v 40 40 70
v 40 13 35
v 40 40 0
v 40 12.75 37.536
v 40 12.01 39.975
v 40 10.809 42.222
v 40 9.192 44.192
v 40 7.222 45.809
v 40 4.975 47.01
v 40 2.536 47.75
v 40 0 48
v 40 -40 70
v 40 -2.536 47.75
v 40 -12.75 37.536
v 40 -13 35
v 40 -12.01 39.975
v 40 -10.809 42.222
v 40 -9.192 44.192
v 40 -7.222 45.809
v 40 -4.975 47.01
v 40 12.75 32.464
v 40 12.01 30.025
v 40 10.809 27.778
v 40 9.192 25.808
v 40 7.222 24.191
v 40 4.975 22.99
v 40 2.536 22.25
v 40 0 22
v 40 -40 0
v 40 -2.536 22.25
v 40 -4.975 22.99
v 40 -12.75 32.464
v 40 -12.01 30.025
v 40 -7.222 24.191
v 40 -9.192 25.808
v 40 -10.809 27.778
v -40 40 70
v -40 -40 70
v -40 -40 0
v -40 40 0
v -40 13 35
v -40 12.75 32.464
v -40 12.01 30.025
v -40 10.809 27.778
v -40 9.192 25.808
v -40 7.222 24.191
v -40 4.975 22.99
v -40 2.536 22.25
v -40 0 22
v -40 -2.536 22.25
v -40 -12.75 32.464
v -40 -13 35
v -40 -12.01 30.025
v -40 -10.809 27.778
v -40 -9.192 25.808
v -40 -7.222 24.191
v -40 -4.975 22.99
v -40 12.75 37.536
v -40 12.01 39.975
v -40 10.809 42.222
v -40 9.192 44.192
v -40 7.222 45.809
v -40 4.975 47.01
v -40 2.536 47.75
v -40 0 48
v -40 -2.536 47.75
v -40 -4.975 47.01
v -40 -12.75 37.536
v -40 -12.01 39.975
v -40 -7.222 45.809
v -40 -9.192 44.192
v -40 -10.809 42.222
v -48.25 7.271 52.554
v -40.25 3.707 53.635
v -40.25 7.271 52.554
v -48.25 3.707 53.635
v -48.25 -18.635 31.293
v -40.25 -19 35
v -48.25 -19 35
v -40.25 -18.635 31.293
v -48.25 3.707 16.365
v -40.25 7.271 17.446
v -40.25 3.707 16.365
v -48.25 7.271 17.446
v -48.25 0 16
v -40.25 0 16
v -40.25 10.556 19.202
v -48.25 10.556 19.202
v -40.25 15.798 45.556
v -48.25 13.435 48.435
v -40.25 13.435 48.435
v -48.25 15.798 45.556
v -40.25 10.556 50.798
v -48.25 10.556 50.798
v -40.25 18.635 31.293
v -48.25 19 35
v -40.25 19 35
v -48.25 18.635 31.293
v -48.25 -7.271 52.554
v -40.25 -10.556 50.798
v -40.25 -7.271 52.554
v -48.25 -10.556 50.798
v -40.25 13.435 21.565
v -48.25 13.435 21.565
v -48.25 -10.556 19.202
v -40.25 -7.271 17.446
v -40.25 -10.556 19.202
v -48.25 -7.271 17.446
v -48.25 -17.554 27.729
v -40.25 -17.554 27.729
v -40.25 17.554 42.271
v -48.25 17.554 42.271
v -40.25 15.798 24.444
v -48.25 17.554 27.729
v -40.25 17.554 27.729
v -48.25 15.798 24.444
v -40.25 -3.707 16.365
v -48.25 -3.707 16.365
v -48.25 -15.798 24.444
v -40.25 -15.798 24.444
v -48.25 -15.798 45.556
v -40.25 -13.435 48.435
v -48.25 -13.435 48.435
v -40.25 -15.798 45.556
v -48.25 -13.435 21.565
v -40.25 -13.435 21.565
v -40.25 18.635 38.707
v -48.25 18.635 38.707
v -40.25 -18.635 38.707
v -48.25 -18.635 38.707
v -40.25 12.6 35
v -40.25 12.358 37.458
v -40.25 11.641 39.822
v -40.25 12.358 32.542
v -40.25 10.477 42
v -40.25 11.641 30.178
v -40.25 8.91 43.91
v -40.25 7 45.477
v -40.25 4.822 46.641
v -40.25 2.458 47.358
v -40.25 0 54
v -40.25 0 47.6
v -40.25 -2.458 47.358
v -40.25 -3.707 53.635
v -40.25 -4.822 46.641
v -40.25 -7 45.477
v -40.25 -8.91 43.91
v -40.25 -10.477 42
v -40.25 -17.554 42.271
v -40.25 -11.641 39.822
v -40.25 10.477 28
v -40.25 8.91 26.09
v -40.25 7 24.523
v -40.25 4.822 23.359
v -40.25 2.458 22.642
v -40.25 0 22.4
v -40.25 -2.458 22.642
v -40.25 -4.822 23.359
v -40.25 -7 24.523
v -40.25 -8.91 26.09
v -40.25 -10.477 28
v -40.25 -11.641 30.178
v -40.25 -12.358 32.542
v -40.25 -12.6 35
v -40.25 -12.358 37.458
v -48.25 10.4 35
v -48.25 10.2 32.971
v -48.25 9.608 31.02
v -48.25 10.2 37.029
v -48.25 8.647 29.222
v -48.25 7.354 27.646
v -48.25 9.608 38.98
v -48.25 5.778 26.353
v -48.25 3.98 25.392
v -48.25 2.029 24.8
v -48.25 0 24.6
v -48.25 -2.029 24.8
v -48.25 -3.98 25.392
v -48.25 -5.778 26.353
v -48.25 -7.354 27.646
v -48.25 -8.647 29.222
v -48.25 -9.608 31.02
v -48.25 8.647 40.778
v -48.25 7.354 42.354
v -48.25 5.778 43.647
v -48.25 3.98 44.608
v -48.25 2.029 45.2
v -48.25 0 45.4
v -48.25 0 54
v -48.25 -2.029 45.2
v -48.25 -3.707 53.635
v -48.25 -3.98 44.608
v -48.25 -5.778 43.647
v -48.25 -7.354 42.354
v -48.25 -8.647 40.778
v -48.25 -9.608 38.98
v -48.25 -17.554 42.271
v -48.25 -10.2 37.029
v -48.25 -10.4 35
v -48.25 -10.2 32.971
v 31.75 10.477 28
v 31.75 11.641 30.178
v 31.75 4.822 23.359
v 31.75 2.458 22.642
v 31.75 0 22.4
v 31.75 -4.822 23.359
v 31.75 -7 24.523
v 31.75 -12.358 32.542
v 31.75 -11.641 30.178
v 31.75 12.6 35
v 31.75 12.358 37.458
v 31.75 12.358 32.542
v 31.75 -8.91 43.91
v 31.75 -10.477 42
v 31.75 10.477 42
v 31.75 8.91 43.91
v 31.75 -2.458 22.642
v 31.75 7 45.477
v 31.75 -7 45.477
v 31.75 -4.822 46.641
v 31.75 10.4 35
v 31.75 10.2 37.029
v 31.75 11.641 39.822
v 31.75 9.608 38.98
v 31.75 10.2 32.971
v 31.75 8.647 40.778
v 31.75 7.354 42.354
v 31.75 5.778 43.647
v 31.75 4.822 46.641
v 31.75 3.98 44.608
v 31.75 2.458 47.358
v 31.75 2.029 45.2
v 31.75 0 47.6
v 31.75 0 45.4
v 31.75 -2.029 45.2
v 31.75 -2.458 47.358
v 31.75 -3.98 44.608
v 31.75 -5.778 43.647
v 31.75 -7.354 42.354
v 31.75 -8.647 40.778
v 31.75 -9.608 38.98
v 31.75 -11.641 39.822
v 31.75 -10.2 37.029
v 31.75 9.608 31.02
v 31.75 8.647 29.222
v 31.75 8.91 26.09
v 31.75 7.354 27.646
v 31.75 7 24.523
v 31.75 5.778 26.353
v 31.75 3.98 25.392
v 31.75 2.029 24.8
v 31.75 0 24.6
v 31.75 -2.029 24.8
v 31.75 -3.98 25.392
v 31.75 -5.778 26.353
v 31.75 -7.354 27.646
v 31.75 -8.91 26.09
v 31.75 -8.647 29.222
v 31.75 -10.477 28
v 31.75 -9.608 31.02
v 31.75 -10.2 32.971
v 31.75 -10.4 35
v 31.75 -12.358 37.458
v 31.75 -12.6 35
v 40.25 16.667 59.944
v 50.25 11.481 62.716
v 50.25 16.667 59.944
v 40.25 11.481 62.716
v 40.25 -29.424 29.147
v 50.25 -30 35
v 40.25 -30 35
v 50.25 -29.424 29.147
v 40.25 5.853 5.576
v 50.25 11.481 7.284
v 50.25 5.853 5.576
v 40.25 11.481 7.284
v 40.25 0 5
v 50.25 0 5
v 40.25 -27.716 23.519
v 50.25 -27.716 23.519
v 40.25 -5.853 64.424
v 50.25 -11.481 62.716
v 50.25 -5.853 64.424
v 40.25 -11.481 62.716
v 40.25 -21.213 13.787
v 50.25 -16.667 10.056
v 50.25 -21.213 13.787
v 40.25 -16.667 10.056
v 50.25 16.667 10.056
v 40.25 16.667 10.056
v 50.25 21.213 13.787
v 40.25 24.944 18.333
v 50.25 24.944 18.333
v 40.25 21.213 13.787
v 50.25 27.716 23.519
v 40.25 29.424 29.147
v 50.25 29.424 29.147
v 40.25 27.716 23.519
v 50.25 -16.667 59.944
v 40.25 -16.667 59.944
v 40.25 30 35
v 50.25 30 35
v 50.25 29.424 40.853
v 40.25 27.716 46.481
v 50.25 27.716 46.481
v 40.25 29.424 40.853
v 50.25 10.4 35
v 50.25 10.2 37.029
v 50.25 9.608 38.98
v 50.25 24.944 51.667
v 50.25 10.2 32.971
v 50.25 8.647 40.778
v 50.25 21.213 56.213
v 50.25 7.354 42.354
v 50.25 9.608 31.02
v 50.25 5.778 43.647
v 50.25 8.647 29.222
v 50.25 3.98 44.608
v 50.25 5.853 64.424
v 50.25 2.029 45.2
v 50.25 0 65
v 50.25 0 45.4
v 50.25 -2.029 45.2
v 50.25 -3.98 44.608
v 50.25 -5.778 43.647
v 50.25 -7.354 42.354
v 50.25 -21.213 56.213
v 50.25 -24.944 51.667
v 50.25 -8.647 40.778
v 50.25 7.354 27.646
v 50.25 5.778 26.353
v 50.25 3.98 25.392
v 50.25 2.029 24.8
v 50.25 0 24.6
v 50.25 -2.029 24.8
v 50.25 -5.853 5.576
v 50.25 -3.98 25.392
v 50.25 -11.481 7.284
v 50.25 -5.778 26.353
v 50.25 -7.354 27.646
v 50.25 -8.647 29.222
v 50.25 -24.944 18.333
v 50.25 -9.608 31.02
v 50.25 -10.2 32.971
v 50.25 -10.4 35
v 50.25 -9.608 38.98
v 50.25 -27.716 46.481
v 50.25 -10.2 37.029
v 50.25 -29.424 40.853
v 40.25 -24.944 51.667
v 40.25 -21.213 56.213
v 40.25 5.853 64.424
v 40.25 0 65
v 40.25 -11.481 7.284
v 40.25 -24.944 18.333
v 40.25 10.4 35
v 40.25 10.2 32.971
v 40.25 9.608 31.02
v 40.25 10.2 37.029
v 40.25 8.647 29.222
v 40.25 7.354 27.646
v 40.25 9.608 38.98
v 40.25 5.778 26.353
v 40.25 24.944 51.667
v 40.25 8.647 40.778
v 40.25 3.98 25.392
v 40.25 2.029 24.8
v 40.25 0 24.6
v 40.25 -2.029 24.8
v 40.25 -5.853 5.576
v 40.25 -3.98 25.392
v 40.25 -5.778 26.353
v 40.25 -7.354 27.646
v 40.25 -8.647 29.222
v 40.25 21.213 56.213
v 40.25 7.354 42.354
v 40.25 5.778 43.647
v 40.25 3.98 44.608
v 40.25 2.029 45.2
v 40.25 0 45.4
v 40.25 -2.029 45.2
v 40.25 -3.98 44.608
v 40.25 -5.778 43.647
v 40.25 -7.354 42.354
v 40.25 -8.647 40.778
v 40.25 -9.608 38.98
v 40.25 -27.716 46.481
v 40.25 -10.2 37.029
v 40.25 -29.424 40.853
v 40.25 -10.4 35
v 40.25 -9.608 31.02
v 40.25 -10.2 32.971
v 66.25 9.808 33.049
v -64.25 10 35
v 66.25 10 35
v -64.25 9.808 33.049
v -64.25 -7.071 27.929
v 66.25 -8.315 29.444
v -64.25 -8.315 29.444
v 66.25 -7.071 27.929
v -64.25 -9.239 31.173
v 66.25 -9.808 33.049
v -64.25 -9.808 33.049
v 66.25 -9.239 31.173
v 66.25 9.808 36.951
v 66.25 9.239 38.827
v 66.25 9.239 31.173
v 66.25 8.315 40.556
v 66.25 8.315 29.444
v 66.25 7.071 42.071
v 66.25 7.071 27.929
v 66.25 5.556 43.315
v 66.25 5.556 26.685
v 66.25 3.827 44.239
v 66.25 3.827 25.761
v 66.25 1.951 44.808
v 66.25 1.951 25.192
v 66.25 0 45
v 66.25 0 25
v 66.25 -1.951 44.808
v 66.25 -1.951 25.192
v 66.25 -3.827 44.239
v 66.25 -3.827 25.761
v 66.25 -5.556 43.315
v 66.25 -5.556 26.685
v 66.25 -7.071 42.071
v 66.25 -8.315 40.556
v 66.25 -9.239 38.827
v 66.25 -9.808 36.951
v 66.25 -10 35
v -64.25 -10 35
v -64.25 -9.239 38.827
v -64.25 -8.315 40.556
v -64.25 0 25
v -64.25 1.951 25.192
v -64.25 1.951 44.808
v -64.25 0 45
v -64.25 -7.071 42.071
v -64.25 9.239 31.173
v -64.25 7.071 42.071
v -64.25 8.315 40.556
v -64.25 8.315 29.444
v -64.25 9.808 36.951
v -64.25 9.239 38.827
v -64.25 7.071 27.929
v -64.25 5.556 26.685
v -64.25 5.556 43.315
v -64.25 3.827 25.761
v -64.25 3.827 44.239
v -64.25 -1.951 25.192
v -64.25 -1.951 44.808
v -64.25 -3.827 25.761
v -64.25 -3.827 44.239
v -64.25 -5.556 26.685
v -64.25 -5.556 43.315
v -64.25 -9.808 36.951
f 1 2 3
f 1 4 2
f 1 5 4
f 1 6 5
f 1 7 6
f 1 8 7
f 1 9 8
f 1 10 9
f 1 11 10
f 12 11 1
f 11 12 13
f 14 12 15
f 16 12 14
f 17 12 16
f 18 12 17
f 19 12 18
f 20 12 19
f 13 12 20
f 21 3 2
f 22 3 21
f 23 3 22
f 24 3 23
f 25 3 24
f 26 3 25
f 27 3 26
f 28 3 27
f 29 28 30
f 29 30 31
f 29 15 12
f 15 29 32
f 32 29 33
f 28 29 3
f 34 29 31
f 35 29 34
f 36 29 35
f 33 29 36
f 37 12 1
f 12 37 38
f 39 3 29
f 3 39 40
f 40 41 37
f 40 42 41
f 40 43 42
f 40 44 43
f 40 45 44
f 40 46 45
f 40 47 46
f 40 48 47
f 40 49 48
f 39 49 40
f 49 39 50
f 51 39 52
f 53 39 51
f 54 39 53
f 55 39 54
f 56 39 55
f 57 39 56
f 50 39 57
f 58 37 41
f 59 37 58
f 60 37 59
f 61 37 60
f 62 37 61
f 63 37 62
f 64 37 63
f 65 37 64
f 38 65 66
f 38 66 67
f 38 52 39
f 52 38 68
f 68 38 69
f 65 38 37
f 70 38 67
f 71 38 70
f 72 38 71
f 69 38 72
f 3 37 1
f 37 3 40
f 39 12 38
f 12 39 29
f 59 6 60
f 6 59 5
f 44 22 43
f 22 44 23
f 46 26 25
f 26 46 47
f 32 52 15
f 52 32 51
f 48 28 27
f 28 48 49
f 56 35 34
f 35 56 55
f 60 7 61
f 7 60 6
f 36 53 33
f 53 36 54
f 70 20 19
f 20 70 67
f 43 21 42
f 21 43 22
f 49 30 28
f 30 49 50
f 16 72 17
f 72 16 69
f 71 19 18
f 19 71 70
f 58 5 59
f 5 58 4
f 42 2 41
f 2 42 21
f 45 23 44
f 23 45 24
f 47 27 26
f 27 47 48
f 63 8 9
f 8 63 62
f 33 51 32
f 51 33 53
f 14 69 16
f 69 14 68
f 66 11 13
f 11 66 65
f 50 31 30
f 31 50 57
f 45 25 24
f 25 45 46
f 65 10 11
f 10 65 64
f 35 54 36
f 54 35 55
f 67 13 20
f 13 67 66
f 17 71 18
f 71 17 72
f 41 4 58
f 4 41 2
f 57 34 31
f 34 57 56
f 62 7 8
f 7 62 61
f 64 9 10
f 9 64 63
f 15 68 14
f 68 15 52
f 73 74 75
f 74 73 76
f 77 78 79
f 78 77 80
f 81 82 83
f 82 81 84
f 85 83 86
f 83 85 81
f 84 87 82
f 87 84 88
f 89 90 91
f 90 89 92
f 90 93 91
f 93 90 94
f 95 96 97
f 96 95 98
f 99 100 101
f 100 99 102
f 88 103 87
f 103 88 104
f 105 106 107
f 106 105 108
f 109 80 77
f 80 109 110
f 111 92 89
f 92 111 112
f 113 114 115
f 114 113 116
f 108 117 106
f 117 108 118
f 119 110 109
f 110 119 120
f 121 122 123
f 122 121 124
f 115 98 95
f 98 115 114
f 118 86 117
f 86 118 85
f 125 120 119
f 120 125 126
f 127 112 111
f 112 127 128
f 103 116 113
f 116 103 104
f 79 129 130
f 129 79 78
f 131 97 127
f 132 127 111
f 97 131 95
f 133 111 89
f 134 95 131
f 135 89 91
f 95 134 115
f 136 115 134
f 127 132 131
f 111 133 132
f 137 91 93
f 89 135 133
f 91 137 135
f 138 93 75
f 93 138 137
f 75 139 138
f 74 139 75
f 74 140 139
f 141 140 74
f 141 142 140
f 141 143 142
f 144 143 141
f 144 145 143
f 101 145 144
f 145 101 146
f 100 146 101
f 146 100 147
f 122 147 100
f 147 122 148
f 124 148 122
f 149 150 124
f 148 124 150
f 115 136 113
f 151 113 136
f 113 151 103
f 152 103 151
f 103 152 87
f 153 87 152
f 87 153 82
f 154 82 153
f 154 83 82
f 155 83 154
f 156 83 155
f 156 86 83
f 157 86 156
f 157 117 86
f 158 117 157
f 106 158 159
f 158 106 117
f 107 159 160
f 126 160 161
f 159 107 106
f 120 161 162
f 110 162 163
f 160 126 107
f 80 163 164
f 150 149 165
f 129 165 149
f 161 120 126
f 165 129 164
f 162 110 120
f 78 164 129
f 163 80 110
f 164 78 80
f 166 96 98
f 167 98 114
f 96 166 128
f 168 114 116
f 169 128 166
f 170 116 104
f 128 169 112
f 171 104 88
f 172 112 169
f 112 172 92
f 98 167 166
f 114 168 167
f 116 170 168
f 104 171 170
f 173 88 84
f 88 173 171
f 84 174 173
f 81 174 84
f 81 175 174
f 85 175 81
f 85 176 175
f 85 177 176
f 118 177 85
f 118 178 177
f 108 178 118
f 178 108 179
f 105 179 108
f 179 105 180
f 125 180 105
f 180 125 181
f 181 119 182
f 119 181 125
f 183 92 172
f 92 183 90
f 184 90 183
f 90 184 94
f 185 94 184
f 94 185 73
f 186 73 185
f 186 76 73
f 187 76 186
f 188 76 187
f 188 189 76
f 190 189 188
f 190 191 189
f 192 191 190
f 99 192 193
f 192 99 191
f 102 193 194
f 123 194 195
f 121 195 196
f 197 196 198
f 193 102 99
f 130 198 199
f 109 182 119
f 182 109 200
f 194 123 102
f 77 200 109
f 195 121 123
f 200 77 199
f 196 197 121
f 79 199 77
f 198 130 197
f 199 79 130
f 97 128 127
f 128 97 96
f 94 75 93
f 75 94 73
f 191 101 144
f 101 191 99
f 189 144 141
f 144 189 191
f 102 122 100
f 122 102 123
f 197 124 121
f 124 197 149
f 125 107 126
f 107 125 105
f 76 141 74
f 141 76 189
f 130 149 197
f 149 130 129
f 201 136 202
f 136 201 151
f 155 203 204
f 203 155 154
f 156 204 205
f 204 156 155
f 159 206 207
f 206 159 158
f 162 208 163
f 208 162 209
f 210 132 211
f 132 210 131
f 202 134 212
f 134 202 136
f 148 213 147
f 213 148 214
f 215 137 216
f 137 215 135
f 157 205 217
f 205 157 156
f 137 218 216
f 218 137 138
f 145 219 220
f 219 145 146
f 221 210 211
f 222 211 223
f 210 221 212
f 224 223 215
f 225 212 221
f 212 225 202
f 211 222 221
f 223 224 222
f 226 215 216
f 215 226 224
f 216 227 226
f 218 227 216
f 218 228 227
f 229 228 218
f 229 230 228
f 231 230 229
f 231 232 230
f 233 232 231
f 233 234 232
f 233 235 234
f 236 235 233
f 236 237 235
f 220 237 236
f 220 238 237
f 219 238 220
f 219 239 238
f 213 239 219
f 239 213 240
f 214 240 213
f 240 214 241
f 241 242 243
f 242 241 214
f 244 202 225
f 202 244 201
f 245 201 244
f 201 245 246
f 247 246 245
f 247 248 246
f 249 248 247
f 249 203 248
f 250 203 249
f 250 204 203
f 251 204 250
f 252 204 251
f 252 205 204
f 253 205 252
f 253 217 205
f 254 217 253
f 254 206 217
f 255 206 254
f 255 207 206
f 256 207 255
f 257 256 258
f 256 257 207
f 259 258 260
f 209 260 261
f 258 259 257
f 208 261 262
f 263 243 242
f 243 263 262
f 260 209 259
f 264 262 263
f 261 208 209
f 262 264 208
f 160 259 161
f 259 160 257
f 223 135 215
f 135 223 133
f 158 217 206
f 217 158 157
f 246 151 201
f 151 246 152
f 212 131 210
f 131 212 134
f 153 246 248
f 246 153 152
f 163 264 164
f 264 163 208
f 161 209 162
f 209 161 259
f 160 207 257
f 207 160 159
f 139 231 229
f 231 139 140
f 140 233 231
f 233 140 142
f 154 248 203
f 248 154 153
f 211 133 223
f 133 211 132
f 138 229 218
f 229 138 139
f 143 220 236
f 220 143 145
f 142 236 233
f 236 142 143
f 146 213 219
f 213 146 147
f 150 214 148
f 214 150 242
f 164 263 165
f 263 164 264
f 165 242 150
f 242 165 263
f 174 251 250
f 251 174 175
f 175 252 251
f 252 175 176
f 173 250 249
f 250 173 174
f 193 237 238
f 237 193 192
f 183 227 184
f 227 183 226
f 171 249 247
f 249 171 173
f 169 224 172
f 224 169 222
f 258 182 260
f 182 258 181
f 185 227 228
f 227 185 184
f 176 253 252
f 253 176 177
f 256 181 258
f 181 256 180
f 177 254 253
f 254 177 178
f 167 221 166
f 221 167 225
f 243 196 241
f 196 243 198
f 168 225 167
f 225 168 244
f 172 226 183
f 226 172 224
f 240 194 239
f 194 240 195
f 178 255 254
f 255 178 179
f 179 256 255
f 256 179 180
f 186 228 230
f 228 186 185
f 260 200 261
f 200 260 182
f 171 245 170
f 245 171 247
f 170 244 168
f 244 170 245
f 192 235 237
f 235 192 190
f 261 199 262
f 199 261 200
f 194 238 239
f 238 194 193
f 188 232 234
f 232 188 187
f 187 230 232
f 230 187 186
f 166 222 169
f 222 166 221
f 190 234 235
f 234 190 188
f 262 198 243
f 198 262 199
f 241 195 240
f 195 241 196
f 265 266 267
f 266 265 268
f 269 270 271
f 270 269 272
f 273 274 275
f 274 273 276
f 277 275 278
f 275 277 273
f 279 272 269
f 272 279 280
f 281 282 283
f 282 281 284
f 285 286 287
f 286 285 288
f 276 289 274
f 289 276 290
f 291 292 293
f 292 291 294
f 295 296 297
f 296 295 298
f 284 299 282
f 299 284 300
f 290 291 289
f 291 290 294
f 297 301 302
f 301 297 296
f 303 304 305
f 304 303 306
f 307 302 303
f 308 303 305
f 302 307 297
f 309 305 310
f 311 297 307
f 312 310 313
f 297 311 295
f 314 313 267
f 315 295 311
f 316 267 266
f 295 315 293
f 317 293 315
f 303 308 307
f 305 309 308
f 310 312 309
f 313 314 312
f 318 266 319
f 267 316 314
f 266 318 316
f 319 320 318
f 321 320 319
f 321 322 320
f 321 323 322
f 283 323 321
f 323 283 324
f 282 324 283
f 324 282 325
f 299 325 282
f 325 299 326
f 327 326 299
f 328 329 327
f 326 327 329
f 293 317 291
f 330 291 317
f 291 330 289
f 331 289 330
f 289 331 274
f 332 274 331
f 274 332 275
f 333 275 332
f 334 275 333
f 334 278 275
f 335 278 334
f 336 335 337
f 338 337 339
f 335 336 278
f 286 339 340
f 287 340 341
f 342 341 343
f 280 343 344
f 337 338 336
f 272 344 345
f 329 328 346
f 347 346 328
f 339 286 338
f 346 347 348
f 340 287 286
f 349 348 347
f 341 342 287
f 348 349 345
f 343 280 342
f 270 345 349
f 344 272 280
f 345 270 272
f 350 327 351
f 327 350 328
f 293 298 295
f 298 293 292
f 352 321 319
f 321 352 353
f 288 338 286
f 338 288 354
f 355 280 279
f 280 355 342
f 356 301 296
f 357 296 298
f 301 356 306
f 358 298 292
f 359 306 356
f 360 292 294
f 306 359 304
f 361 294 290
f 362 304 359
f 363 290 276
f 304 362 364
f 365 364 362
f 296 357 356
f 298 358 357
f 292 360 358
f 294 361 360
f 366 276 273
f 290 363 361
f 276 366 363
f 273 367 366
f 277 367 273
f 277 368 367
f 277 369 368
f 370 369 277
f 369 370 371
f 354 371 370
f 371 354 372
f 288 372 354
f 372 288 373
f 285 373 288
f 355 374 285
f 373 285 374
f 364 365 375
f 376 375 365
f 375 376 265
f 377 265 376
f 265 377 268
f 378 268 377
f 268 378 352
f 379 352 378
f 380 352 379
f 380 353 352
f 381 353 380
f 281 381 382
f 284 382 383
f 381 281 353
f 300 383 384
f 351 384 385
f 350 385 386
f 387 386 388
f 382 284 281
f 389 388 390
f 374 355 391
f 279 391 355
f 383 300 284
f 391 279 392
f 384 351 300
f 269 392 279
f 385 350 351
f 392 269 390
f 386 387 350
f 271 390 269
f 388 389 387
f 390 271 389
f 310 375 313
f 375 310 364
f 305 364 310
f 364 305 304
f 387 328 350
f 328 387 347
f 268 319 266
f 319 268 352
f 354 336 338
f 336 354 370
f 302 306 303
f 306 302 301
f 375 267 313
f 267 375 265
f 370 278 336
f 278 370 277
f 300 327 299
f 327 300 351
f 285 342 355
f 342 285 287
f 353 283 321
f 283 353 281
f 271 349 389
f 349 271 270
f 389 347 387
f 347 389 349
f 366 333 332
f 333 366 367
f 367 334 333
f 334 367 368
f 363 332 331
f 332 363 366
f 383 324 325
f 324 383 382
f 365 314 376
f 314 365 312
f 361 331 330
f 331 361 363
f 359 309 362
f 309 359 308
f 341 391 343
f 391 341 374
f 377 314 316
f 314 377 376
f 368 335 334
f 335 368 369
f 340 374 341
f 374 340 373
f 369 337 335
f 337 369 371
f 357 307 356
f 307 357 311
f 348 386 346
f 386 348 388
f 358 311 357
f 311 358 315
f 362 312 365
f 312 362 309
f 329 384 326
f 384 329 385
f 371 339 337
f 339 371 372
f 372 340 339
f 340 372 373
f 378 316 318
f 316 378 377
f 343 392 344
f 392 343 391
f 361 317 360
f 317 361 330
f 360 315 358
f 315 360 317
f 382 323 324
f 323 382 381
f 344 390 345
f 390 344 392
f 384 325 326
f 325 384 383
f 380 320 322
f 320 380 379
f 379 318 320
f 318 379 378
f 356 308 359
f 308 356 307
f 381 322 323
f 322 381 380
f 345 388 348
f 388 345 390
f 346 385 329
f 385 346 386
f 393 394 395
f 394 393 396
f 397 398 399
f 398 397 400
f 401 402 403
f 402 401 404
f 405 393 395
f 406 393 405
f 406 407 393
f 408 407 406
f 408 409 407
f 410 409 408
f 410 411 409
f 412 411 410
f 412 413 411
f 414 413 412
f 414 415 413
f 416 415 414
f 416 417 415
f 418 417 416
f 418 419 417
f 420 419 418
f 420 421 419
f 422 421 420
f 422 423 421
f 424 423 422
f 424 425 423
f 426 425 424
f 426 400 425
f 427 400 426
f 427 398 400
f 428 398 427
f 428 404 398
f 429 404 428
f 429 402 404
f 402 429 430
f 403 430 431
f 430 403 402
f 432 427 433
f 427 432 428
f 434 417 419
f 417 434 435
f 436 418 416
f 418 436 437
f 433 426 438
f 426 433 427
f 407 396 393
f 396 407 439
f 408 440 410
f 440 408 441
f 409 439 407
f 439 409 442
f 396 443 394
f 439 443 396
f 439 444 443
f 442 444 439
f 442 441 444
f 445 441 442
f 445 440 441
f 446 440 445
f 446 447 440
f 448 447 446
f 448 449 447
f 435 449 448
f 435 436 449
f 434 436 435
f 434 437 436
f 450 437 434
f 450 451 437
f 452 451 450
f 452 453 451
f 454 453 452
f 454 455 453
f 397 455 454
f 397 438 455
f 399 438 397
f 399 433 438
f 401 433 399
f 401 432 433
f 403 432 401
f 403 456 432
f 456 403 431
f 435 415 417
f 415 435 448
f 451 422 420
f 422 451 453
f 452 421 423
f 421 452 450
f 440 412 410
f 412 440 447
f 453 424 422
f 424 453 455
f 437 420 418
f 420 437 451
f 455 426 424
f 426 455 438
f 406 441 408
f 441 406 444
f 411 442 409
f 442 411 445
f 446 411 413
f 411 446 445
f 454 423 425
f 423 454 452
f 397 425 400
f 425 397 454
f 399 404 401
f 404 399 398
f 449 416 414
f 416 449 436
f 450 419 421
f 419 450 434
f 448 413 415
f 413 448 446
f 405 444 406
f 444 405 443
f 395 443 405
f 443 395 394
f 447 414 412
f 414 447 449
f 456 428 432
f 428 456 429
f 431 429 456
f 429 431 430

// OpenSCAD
$fn = 32;

// ------------------------------------------------------------------------
// Bushed housing: 80 x 80 x 70 mm housing, bushing d25.2
// Every part is its own module, assembly() places them once.
// ------------------------------------------------------------------------

// --- part 1 ---
module housing() {
  difference() {
    translate([-40, -40, 0]) cube([80, 80, 70]);
    translate([0, 0, 35]) rotate([0, 90, 0]) cylinder(h = 82, d = 26, center = true);
  }
}

// --- part 2 ---
module bushing() {
  difference() {
    union() {
      cylinder(h = 8, d = 38);
      translate([0, 0, 8]) cylinder(h = 72, d = 25.2);
    }
    translate([0, 0, -1]) cylinder(h = 82, d = 20.8);
  }
}

// --- part 3 ---
module shaft() {
  translate([0, 0, -65.25]) cylinder(h = 130.5, d = 20);
}

// --- part 4 ---
module cover() {
  difference() {
    cylinder(h = 10, d = 60);
    translate([0, 0, -1]) cylinder(h = 12, d = 20.8);
  }
}

// --- assembly ---
module assembly() {
  translate([0, 0, 0]) rotate([0, 0, 0]) housing();
  translate([-48.25, 0, 35]) rotate([0, 90, 0]) bushing();
  translate([1, 0, 35]) rotate([0, 90, 0]) shaft();
  translate([40.25, 0, 35]) rotate([0, 90, 0]) cover();
}

assembly();
